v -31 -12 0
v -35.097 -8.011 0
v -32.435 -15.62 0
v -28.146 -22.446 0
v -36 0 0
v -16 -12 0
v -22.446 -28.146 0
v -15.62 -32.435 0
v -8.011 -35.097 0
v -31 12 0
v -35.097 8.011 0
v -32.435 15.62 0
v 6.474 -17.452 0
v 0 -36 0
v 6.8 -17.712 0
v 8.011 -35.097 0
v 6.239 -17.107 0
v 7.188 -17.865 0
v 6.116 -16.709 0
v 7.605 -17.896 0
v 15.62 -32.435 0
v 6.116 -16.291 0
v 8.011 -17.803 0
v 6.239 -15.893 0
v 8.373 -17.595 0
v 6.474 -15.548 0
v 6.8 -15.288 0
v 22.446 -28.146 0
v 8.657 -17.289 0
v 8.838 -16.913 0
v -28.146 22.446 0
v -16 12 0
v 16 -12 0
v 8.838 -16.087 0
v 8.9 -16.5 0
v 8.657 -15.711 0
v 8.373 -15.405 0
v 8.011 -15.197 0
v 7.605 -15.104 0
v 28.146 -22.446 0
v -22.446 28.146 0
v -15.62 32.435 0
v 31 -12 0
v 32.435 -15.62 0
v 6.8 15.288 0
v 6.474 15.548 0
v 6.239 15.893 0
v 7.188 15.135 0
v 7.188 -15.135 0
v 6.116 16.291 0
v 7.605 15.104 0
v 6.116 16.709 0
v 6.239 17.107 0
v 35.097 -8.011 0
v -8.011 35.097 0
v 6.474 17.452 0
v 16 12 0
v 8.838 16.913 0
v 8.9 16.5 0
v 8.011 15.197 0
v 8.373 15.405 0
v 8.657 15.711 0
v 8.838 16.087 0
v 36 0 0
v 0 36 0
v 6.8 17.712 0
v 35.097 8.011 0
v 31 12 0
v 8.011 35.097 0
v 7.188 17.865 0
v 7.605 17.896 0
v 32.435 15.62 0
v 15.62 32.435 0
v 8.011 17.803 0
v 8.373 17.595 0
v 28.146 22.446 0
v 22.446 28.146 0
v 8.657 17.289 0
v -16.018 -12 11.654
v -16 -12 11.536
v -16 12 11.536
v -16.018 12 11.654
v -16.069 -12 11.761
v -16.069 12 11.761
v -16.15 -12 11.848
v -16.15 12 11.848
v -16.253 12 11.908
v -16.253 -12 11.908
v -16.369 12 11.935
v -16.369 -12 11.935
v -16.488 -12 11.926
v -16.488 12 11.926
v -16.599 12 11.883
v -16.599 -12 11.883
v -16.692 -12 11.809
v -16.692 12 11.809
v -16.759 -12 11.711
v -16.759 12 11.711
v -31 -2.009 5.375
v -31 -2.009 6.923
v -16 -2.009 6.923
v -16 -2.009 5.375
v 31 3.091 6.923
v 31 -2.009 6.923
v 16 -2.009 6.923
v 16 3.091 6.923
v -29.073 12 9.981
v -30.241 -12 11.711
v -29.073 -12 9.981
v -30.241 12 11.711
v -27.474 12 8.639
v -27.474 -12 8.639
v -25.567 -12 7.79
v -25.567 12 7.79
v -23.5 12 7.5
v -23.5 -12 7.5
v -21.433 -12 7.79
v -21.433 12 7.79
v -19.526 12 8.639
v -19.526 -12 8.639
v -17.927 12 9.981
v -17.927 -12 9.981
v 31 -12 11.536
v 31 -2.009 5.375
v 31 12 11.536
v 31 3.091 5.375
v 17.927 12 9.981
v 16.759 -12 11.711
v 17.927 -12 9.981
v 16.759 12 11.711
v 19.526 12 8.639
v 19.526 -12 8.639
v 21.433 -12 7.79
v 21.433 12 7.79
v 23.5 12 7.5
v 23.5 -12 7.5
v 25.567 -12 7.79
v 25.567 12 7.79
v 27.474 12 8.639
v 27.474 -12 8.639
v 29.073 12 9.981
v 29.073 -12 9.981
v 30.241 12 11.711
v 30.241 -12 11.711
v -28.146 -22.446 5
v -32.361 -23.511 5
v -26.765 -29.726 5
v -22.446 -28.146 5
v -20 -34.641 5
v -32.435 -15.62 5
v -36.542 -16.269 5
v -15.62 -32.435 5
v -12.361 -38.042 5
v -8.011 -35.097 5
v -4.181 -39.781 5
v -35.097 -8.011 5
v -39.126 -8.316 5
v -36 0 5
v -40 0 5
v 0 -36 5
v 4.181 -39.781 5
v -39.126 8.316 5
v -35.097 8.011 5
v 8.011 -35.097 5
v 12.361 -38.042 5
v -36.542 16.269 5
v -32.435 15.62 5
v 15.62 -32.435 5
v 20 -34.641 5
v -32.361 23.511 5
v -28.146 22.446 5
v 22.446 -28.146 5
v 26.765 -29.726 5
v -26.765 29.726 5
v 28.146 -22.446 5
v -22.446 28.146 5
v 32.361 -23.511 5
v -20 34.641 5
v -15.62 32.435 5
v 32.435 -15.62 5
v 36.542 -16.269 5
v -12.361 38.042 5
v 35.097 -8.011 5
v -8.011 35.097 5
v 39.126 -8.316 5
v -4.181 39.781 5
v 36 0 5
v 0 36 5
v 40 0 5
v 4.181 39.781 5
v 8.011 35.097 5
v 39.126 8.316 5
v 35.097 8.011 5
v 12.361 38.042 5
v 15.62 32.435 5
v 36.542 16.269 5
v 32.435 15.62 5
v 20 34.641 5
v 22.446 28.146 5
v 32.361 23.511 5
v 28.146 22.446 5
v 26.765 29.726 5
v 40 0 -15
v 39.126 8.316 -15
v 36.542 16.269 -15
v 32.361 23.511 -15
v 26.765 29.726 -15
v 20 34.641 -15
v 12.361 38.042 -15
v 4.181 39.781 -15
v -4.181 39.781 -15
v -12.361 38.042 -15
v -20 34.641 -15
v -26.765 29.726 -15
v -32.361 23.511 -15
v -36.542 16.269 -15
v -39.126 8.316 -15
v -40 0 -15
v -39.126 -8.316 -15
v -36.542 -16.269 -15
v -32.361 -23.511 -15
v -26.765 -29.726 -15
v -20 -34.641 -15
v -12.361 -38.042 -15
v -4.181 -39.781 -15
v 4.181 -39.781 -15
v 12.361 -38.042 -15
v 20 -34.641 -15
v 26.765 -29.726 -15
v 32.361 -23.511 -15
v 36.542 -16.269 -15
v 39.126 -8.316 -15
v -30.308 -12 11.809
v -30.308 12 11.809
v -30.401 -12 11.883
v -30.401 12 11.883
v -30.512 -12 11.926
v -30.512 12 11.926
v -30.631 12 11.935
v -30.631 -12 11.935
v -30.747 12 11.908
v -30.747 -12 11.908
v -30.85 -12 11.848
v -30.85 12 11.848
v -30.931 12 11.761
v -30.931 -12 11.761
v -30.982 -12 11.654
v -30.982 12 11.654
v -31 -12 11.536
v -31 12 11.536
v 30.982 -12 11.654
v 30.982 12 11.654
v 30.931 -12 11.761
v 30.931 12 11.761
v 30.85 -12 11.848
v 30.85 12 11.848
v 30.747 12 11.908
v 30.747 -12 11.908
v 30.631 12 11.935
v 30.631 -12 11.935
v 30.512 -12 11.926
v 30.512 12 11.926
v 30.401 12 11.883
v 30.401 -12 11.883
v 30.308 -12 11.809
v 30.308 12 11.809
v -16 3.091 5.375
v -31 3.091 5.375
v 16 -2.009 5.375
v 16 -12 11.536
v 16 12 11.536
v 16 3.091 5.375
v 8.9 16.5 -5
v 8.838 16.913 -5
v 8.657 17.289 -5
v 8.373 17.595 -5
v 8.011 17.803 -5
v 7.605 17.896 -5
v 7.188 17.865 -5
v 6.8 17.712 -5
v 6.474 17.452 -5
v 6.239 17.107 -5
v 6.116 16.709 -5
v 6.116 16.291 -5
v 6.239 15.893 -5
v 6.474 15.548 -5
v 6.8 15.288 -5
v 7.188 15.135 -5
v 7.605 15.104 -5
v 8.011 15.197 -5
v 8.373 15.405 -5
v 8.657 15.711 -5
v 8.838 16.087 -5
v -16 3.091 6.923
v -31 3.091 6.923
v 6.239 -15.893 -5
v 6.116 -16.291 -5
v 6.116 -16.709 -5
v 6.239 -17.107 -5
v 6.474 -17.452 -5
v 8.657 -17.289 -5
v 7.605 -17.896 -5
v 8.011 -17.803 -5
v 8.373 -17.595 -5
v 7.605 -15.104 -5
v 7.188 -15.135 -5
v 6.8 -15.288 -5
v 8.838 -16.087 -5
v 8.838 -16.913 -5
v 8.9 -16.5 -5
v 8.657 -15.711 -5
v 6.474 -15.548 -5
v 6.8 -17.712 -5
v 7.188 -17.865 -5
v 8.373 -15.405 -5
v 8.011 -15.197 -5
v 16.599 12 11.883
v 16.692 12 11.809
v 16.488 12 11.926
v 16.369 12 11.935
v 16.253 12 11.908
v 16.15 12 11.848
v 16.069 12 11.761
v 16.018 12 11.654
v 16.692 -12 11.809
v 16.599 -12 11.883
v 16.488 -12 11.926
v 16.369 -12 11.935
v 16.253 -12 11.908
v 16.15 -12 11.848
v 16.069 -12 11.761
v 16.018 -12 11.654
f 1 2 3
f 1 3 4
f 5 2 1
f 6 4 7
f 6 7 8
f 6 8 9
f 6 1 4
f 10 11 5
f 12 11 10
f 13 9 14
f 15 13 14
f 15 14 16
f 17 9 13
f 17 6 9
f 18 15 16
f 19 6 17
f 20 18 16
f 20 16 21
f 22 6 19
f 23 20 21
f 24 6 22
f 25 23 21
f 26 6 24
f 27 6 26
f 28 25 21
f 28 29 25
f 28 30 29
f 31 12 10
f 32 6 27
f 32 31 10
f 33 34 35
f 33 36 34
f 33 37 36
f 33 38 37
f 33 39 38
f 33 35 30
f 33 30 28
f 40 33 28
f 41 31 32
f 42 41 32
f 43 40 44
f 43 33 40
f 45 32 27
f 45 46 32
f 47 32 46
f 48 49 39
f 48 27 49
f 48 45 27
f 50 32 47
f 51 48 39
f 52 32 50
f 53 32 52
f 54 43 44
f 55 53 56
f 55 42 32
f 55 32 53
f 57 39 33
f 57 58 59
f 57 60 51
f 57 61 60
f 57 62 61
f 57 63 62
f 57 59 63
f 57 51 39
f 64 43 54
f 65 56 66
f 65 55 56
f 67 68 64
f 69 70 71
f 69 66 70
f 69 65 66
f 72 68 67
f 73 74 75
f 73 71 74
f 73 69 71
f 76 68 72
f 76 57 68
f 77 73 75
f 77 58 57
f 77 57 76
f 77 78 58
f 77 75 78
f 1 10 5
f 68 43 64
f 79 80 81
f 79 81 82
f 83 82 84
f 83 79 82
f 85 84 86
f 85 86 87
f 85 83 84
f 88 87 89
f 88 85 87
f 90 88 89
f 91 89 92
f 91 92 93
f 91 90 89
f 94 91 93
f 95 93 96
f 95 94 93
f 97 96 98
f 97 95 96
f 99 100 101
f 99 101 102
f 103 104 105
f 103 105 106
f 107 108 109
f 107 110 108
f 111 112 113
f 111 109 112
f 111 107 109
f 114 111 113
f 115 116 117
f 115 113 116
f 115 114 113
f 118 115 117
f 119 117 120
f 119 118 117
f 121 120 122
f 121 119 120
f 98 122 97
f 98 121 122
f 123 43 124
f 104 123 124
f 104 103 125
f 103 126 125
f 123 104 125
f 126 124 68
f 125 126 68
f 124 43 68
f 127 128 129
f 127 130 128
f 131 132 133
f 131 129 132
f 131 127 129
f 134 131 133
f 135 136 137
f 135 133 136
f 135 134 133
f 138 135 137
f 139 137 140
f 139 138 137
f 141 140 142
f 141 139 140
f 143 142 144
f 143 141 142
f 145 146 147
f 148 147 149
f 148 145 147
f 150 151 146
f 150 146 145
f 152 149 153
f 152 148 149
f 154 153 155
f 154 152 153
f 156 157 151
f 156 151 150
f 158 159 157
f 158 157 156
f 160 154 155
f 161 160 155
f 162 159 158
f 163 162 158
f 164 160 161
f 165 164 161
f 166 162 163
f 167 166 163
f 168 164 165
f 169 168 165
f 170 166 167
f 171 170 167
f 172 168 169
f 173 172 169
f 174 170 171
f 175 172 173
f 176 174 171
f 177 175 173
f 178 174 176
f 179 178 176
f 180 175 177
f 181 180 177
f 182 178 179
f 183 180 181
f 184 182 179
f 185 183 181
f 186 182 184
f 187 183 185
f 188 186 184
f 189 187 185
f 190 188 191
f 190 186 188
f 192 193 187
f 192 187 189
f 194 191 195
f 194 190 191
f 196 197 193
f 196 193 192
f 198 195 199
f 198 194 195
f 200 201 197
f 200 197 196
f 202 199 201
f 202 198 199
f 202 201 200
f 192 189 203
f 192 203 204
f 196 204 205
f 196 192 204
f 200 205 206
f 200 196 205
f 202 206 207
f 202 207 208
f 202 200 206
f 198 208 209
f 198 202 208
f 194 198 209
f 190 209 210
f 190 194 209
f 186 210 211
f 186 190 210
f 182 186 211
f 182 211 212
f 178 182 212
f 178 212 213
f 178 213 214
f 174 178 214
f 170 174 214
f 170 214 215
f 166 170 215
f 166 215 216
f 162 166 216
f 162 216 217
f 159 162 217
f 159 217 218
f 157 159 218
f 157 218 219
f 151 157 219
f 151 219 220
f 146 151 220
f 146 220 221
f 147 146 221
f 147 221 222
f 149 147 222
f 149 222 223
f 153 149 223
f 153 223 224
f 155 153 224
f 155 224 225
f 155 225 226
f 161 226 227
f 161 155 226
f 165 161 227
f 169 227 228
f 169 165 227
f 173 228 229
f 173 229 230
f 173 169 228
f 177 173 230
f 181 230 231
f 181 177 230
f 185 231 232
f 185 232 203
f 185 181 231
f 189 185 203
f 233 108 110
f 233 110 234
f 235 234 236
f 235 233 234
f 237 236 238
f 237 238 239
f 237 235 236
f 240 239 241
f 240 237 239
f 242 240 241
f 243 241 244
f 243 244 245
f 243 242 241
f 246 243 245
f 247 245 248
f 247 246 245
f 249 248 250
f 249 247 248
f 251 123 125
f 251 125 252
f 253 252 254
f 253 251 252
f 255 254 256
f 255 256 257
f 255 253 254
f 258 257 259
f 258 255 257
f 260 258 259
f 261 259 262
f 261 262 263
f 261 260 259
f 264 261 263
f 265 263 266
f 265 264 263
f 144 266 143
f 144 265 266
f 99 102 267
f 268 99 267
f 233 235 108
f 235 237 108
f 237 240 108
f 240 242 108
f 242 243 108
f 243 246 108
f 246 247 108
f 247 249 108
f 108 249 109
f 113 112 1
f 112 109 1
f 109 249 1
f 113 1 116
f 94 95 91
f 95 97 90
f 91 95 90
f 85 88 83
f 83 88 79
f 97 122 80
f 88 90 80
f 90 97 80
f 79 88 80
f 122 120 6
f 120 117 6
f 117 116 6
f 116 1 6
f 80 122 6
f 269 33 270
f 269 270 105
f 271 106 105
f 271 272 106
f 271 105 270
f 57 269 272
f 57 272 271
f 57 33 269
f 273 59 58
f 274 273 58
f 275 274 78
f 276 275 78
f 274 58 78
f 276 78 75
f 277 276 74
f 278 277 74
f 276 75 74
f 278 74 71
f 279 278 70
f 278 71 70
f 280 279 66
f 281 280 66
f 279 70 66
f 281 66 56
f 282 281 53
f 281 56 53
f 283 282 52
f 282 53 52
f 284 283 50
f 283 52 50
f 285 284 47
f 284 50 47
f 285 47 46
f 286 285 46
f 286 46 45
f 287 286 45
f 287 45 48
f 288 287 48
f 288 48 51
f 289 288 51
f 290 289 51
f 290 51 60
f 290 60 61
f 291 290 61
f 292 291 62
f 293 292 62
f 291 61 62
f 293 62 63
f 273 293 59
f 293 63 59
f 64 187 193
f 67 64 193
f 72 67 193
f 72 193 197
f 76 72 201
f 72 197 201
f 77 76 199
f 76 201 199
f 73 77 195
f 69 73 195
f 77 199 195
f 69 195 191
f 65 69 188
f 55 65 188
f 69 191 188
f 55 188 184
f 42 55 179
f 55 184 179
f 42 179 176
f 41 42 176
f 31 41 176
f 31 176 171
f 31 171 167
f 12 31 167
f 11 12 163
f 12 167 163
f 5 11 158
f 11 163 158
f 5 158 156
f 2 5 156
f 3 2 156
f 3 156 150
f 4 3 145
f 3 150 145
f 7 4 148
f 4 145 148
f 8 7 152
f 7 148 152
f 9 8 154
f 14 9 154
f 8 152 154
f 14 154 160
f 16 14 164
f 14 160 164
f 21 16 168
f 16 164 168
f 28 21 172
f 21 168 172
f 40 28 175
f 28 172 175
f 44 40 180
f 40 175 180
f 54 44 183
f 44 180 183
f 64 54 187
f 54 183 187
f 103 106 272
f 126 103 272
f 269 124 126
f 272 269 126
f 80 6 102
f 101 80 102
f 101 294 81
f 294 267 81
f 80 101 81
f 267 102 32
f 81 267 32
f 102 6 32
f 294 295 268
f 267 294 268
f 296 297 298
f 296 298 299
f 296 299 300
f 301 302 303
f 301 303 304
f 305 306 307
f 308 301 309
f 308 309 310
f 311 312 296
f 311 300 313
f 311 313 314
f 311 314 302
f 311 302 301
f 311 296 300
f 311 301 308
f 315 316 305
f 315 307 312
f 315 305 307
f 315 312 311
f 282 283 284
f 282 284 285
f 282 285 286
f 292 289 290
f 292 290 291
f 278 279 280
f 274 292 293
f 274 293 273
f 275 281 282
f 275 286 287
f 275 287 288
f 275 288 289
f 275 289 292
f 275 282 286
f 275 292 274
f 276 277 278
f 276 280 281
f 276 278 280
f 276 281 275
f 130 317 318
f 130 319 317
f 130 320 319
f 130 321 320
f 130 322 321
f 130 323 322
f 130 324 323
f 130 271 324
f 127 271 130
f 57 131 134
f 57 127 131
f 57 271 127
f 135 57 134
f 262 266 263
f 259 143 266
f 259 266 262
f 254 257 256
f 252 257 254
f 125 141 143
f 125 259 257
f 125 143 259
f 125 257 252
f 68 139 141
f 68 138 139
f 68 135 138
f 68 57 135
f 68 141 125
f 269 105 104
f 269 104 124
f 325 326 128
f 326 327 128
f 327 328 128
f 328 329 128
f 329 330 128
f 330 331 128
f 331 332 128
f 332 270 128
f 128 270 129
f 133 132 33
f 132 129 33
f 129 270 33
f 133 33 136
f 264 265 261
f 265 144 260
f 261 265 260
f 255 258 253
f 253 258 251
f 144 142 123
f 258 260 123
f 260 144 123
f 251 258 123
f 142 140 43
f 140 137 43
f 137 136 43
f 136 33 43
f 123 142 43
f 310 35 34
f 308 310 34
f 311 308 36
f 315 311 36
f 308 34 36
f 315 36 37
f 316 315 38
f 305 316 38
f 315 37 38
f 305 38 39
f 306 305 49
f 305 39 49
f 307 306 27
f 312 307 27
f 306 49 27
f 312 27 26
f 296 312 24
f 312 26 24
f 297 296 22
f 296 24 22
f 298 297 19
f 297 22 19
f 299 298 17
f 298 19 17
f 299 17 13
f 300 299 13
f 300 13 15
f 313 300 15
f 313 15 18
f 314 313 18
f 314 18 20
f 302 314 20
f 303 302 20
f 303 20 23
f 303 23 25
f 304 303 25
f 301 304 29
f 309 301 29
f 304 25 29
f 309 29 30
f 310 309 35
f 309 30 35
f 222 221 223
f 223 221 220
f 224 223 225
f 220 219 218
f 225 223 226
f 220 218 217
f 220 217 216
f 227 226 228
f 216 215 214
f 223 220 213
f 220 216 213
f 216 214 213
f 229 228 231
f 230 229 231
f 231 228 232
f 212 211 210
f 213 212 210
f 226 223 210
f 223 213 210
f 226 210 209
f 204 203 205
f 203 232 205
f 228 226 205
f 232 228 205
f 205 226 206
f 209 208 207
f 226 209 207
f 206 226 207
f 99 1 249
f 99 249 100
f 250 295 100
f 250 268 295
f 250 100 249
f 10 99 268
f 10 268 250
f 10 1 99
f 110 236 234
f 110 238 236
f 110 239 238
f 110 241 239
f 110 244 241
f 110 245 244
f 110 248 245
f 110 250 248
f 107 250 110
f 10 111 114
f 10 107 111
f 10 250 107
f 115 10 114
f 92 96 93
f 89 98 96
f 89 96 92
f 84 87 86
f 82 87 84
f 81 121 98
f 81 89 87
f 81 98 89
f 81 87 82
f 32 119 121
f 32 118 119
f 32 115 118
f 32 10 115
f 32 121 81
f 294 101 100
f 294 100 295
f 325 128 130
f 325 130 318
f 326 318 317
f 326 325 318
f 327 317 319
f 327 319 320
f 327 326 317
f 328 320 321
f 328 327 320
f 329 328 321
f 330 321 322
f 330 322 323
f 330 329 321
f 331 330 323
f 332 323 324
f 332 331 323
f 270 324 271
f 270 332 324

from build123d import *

# Parameters (mm, degrees)
SKETCH_1_R               = 40
EXTRUDE_4_DEPTH          = 15
SKETCH_1_8_W             = 15
SKETCH_1_8_H             = 24
EXTRUDE_5_DEPTH          = 15
EXTRUDE_START            = 5
SKETCH_1_9_R             = 40
SKETCH_1_9_R_2           = 36
EXTRUDE_6_DEPTH          = 5
CUT_EXTRUDE_1_DEPTH      = 68.297845434
CUT_EXTRUDE_1_DEPTH_BACK = 68.297845434
SKETCH_2_R               = 7.5
FILLET_START             = -13
FILLET_1_DEPTH           = 26
CUT_EXTRUDE_2_DEPTH      = 83.861329943
CUT_EXTRUDE_2_DEPTH_BACK = 83.861329943
SKETCH_3_W               = 1.548025895
SKETCH_3_H               = 5.100179719
SKETCH_4_R               = 1.5
CUT_EXTRUDE_3_DEPTH      = 5
EXTRUDE_8_DEPTH          = 5
SKETCH_5_4_R             = 1.4
CUT_EXTRUDE_4_DEPTH      = 5


with BuildPart() as part:
    # 스케치1 → 보스-돌출4 (new body)
    with BuildSketch(Plane.XY):
        Circle(SKETCH_1_R)
    extrude(amount=-EXTRUDE_4_DEPTH)

    # 스케치1<8> → 보스-돌출5 (add)
    with BuildSketch(Plane.XY):
        with Locations((-23.5, 0)):
            Rectangle(SKETCH_1_8_W, SKETCH_1_8_H)
        with Locations((23.5, 0)):
            Rectangle(SKETCH_1_8_W, SKETCH_1_8_H)
    extrude(amount=EXTRUDE_5_DEPTH)

    # 스케치1<9> → 보스-돌출6 (add)
    with BuildSketch(Plane.XY.offset(EXTRUDE_START)):
        Circle(SKETCH_1_9_R)
        Circle(SKETCH_1_9_R_2, mode=Mode.SUBTRACT)
    extrude(amount=-EXTRUDE_6_DEPTH)

    # 스케치2 → 컷-돌출1 (cut, two sides: drawn at the far end of the back side and taken through both)
    with BuildSketch(Plane.XZ.offset(12).offset(-CUT_EXTRUDE_1_DEPTH_BACK)):
        with Locations((-23.5, 15)):
            Circle(SKETCH_2_R)
        with Locations((23.5, 15)):
            Circle(SKETCH_2_R)
    extrude(amount=CUT_EXTRUDE_1_DEPTH + CUT_EXTRUDE_1_DEPTH_BACK, mode=Mode.SUBTRACT)

    # 필렛1: read off the stored shape, not the designer's step
    # 필렛1 outline → 필렛1 (cut)
    with BuildSketch(Plane(origin=(0, 0, 0), x_dir=(1, 0, 0), z_dir=(0, 1, 0)).offset(FILLET_START)):
        with BuildLine():
            Line((31, -15), (31, -11.535898385))
            ThreePointArc((31, -11.535898385), (30.690007032, -11.925640266), (30.240506329, -11.711295935))
            ThreePointArc((30.240506329, -11.711295935), (30.807660278, -13.312368149), (31, -15))
        make_face()
        with BuildLine():
            ThreePointArc((16, -15), (16.192339722, -13.312368149), (16.759493671, -11.711295935))
            ThreePointArc((16.759493671, -11.711295935), (16.309992968, -11.925640266), (16, -11.535898385))
            Line((16, -11.535898385), (16, -15))
        make_face()
        with BuildLine():
            Line((-16, -15), (-16, -11.535898385))
            ThreePointArc((-16, -11.535898385), (-16.309992968, -11.925640266), (-16.759493671, -11.711295935))
            ThreePointArc((-16.759493671, -11.711295935), (-16.192339722, -13.312368149), (-16, -15))
        make_face()
        with BuildLine():
            ThreePointArc((-31, -15), (-30.807660278, -13.312368149), (-30.240506329, -11.711295935))
            ThreePointArc((-30.240506329, -11.711295935), (-30.690007032, -11.925640266), (-31, -11.535898385))
            Line((-31, -11.535898385), (-31, -15))
        make_face()
    extrude(amount=FILLET_1_DEPTH, mode=Mode.SUBTRACT)

    # 스케치3 → 컷-돌출2 (cut, two sides: drawn at the far end of the back side and taken through both)
    with BuildSketch(Plane(origin=(31, 0, 0), x_dir=(0, 0, -1), z_dir=(1, 0, 0)).offset(-CUT_EXTRUDE_2_DEPTH_BACK)):
        with Locations((-6.14855499, 0.540949065)):
            Rectangle(SKETCH_3_W, SKETCH_3_H)
    extrude(amount=CUT_EXTRUDE_2_DEPTH + CUT_EXTRUDE_2_DEPTH_BACK, mode=Mode.SUBTRACT)

    # 스케치4 → 컷-돌출3 (cut)
    with BuildSketch(Plane.XY):
        with Locations((7.5, 15)):
            Circle(SKETCH_4_R)
        with Locations((7.5, -15)):
            Circle(SKETCH_4_R)
    extrude(amount=-CUT_EXTRUDE_3_DEPTH, mode=Mode.SUBTRACT)

    # 스케치5 → 보스-돌출8 (add)
    with BuildSketch(Plane.XY):
        with BuildLine():
            Line((7.5, 15.1), (7.5, 15))
            Line((7.5, 15), (7.5, 13.5))
            ThreePointArc((7.5, 13.5), (8.560660172, 13.939339828), (9, 15))
            ThreePointArc((9, 15), (8.933057899, 15.443108405), (8.738206588, 15.846666667))
            ThreePointArc((8.738206588, 15.846666667), (8.222956891, 15.301111626), (7.5, 15.1))
        make_face()
        with BuildLine():
            Line((7.5, 13.5), (7.5, 15))
            Line((7.5, 15), (7.5, 15.1))
            ThreePointArc((7.5, 15.1), (6.777043109, 15.301111626), (6.261793412, 15.846666667))
            ThreePointArc((6.261793412, 15.846666667), (6.173350084, 14.3), (7.5, 13.5))
        make_face()
        with BuildLine():
            ThreePointArc((6.261793412, 15.846666667), (6.777043109, 15.301111626), (7.5, 15.1))
            Line((7.5, 15.1), (7.5, 16.5))
            ThreePointArc((7.5, 16.5), (6.8, 16.326649916), (6.261793412, 15.846666667))
        make_face()
        with BuildLine():
            Line((7.5, 16.5), (7.5, 15.1))
            ThreePointArc((7.5, 15.1), (8.222956891, 15.301111626), (8.738206588, 15.846666667))
            ThreePointArc((8.738206588, 15.846666667), (8.2, 16.326649916), (7.5, 16.5))
        make_face()
        with BuildLine():
            ThreePointArc((9, -15), (8.560660172, -13.939339828), (7.5, -13.5))
            Line((7.5, -13.5), (7.5, -15))
            Line((7.5, -15), (7.5, -15.1))
            ThreePointArc((7.5, -15.1), (8.222956891, -15.301111626), (8.738206588, -15.846666667))
            ThreePointArc((8.738206588, -15.846666667), (8.933057899, -15.443108405), (9, -15))
        make_face()
        with BuildLine():
            Line((7.5, -15), (7.5, -13.5))
            ThreePointArc((7.5, -13.5), (6.173350084, -14.3), (6.261793412, -15.846666667))
            ThreePointArc((6.261793412, -15.846666667), (6.777043109, -15.301111626), (7.5, -15.1))
            Line((7.5, -15.1), (7.5, -15))
        make_face()
        with BuildLine():
            ThreePointArc((7.5, -15.1), (6.777043109, -15.301111626), (6.261793412, -15.846666667))
            ThreePointArc((6.261793412, -15.846666667), (6.8, -16.326649916), (7.5, -16.5))
            Line((7.5, -16.5), (7.5, -15.1))
        make_face()
        with BuildLine():
            ThreePointArc((8.738206588, -15.846666667), (8.222956891, -15.301111626), (7.5, -15.1))
            Line((7.5, -15.1), (7.5, -16.5))
            ThreePointArc((7.5, -16.5), (8.2, -16.326649916), (8.738206588, -15.846666667))
        make_face()
    extrude(amount=-EXTRUDE_8_DEPTH)

    # 스케치5<4> → 컷-돌출4 (cut)
    with BuildSketch(Plane.XY):
        with Locations((7.5, 16.5)):
            Circle(SKETCH_5_4_R)
        with Locations((7.5, -16.5)):
            Circle(SKETCH_5_4_R)
    extrude(amount=-CUT_EXTRUDE_4_DEPTH, mode=Mode.SUBTRACT)


solid = part.part
